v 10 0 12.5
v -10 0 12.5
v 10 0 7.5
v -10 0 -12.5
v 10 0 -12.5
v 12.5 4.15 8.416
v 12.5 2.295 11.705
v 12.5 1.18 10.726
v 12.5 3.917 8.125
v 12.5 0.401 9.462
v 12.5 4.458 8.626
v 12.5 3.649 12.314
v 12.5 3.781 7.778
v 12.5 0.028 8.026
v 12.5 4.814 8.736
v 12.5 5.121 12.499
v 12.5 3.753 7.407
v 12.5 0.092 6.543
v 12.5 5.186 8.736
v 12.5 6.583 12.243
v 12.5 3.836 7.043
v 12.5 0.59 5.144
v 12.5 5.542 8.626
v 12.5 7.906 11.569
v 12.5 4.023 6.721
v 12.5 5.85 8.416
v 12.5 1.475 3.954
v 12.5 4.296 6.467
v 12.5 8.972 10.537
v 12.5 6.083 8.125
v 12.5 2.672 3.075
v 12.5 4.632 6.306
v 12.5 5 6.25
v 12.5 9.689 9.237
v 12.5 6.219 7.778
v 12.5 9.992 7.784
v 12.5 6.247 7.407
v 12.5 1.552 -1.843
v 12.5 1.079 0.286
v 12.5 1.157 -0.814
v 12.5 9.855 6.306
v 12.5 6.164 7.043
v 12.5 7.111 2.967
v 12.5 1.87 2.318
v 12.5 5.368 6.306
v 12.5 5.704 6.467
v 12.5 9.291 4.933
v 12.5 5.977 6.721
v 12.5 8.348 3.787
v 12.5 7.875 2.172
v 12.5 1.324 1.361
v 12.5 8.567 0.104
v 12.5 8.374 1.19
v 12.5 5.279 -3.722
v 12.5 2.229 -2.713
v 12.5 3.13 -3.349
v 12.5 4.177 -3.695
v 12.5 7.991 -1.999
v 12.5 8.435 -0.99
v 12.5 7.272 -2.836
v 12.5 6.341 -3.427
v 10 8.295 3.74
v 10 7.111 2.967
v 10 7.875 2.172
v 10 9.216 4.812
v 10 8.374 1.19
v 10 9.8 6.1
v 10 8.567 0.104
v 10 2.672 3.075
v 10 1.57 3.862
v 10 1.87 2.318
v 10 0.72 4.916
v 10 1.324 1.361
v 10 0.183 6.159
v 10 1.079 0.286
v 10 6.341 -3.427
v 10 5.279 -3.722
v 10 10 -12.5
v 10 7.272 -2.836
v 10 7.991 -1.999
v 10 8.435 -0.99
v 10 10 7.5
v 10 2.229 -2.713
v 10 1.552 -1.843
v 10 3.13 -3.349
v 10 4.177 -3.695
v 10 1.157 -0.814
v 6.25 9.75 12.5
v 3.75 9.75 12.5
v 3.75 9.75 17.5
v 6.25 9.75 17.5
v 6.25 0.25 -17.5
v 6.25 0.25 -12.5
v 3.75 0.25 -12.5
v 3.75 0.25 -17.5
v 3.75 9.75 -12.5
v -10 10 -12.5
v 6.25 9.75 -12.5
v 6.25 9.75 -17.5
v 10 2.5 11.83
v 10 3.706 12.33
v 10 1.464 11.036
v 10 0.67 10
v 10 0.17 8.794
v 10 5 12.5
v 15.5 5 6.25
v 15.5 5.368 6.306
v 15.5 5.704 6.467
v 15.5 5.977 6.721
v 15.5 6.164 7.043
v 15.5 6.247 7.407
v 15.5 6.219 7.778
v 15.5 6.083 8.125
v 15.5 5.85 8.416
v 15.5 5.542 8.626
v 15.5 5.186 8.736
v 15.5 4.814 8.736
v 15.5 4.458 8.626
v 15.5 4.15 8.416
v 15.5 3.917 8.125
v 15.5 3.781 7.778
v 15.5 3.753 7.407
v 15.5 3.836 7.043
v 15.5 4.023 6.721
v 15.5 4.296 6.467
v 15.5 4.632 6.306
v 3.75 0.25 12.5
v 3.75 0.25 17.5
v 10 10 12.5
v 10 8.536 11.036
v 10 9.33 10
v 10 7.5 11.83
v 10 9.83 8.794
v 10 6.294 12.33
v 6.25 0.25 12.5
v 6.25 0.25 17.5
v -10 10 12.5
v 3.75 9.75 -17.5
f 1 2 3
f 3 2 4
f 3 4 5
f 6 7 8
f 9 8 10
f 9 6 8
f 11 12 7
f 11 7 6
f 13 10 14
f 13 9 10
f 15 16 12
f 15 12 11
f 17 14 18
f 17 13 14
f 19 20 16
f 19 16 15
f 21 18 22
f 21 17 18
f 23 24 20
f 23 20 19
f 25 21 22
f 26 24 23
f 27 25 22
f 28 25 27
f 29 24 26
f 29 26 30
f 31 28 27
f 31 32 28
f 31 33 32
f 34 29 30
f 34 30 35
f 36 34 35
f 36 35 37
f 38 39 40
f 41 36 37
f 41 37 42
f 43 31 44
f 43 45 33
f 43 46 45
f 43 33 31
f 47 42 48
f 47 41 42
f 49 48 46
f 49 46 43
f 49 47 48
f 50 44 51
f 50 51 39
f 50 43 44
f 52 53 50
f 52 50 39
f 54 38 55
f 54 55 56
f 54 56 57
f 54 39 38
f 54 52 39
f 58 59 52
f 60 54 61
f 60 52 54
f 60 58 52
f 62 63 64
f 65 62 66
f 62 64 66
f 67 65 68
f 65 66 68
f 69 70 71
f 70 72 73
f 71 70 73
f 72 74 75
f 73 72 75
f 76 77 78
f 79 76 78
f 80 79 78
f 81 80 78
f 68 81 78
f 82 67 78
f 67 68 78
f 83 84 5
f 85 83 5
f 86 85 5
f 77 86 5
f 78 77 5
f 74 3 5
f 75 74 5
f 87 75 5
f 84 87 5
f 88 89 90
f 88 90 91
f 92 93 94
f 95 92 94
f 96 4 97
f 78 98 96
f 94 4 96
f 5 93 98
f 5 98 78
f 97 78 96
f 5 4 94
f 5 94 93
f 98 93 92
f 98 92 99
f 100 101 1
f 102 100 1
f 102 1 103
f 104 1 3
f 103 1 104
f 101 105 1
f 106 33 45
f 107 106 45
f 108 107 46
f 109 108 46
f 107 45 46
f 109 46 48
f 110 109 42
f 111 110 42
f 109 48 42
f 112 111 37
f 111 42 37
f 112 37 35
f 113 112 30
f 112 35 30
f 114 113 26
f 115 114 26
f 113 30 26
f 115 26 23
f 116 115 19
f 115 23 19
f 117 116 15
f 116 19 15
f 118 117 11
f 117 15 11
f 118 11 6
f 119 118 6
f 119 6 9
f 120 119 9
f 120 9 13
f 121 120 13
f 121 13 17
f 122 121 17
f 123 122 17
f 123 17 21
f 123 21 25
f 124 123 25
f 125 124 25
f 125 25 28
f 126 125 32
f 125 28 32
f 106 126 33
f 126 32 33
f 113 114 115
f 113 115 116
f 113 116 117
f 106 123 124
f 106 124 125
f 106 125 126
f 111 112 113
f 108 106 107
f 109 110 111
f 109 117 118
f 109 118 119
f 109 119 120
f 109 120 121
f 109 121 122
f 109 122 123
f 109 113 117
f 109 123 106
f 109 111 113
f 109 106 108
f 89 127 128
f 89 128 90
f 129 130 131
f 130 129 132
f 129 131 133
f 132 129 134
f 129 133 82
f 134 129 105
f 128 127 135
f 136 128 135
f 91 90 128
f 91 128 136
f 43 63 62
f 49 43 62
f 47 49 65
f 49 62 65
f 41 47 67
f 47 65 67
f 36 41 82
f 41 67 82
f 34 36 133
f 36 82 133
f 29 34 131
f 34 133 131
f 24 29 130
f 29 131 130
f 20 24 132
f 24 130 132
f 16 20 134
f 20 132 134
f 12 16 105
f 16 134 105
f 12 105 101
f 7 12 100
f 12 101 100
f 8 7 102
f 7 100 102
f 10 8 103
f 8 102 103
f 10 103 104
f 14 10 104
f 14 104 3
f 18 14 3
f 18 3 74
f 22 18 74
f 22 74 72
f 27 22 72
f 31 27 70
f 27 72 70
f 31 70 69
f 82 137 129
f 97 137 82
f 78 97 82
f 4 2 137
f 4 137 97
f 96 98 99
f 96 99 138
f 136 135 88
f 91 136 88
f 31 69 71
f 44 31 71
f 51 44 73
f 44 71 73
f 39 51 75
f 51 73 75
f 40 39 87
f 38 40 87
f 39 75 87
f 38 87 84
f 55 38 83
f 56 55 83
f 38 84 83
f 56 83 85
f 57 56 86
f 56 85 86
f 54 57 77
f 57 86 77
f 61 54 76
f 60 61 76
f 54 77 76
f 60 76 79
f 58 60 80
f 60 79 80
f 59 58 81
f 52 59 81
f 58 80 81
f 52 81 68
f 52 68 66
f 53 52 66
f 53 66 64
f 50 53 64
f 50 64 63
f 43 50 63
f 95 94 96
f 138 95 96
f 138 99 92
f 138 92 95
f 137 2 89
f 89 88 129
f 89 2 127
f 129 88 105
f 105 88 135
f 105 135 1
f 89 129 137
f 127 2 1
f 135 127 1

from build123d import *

# Parameters (mm, degrees)
SKETCH1_W           = 20
SKETCH1_H           = 25
BOSS_EXTRUDE1_DEPTH = 10
SKETCH3_W           = 2.5
SKETCH3_H           = 9.5
BOSS_EXTRUDE3_DEPTH = 5
SKETCH4_W           = 2.5
SKETCH4_H           = 9.5
BOSS_EXTRUDE4_DEPTH = 5
BOSS_EXTRUDE5_DEPTH = 2.5
SKETCH6_R           = 1.25
BOSS_EXTRUDE6_DEPTH = 3


with BuildPart() as part:
    # Sketch1 → Boss-Extrude1 (new body)
    with BuildSketch(Plane(origin=(0, 0, 0), x_dir=(1, 0, 0), z_dir=(0, 1, 0))):
        Rectangle(SKETCH1_W, SKETCH1_H)
    extrude(amount=BOSS_EXTRUDE1_DEPTH)

    # Sketch3 → Boss-Extrude3 (add)
    with BuildSketch(Plane(origin=(0, 0, -12.5), x_dir=(-1, 0, 0), z_dir=(0, 0, -1))):
        with Locations((-5, 5)):
            Rectangle(SKETCH3_W, SKETCH3_H)
    extrude(amount=BOSS_EXTRUDE3_DEPTH)

    # Sketch4 → Boss-Extrude4 (add)
    with BuildSketch(Plane.XY.offset(12.5)):
        with Locations((5, 5)):
            Rectangle(SKETCH4_W, SKETCH4_H)
    extrude(amount=BOSS_EXTRUDE4_DEPTH)

    # Sketch5 → Boss-Extrude5 (add)
    with BuildSketch(Plane(origin=(10, 0, 0), x_dir=(0, 0, -1), z_dir=(1, 0, 0))):
        with BuildLine():
            ThreePointArc((-2.967408029, 7.110831595), (-12.498528779, 5.121284968), (-3.075116724, 2.671823033))
            ThreePointArc((-3.075116724, 2.671823033), (3.748896584, 4.727055275), (-2.967408029, 7.110831595))
        make_face()
    extrude(amount=BOSS_EXTRUDE5_DEPTH)

    # Sketch6 → Boss-Extrude6 (add)
    with BuildSketch(Plane(origin=(12.5, 0, 0), x_dir=(0, 0, -1), z_dir=(1, 0, 0))):
        with Locations((-7.5, 5)):
            Circle(SKETCH6_R)
    extrude(amount=BOSS_EXTRUDE6_DEPTH)


solid = part.part
